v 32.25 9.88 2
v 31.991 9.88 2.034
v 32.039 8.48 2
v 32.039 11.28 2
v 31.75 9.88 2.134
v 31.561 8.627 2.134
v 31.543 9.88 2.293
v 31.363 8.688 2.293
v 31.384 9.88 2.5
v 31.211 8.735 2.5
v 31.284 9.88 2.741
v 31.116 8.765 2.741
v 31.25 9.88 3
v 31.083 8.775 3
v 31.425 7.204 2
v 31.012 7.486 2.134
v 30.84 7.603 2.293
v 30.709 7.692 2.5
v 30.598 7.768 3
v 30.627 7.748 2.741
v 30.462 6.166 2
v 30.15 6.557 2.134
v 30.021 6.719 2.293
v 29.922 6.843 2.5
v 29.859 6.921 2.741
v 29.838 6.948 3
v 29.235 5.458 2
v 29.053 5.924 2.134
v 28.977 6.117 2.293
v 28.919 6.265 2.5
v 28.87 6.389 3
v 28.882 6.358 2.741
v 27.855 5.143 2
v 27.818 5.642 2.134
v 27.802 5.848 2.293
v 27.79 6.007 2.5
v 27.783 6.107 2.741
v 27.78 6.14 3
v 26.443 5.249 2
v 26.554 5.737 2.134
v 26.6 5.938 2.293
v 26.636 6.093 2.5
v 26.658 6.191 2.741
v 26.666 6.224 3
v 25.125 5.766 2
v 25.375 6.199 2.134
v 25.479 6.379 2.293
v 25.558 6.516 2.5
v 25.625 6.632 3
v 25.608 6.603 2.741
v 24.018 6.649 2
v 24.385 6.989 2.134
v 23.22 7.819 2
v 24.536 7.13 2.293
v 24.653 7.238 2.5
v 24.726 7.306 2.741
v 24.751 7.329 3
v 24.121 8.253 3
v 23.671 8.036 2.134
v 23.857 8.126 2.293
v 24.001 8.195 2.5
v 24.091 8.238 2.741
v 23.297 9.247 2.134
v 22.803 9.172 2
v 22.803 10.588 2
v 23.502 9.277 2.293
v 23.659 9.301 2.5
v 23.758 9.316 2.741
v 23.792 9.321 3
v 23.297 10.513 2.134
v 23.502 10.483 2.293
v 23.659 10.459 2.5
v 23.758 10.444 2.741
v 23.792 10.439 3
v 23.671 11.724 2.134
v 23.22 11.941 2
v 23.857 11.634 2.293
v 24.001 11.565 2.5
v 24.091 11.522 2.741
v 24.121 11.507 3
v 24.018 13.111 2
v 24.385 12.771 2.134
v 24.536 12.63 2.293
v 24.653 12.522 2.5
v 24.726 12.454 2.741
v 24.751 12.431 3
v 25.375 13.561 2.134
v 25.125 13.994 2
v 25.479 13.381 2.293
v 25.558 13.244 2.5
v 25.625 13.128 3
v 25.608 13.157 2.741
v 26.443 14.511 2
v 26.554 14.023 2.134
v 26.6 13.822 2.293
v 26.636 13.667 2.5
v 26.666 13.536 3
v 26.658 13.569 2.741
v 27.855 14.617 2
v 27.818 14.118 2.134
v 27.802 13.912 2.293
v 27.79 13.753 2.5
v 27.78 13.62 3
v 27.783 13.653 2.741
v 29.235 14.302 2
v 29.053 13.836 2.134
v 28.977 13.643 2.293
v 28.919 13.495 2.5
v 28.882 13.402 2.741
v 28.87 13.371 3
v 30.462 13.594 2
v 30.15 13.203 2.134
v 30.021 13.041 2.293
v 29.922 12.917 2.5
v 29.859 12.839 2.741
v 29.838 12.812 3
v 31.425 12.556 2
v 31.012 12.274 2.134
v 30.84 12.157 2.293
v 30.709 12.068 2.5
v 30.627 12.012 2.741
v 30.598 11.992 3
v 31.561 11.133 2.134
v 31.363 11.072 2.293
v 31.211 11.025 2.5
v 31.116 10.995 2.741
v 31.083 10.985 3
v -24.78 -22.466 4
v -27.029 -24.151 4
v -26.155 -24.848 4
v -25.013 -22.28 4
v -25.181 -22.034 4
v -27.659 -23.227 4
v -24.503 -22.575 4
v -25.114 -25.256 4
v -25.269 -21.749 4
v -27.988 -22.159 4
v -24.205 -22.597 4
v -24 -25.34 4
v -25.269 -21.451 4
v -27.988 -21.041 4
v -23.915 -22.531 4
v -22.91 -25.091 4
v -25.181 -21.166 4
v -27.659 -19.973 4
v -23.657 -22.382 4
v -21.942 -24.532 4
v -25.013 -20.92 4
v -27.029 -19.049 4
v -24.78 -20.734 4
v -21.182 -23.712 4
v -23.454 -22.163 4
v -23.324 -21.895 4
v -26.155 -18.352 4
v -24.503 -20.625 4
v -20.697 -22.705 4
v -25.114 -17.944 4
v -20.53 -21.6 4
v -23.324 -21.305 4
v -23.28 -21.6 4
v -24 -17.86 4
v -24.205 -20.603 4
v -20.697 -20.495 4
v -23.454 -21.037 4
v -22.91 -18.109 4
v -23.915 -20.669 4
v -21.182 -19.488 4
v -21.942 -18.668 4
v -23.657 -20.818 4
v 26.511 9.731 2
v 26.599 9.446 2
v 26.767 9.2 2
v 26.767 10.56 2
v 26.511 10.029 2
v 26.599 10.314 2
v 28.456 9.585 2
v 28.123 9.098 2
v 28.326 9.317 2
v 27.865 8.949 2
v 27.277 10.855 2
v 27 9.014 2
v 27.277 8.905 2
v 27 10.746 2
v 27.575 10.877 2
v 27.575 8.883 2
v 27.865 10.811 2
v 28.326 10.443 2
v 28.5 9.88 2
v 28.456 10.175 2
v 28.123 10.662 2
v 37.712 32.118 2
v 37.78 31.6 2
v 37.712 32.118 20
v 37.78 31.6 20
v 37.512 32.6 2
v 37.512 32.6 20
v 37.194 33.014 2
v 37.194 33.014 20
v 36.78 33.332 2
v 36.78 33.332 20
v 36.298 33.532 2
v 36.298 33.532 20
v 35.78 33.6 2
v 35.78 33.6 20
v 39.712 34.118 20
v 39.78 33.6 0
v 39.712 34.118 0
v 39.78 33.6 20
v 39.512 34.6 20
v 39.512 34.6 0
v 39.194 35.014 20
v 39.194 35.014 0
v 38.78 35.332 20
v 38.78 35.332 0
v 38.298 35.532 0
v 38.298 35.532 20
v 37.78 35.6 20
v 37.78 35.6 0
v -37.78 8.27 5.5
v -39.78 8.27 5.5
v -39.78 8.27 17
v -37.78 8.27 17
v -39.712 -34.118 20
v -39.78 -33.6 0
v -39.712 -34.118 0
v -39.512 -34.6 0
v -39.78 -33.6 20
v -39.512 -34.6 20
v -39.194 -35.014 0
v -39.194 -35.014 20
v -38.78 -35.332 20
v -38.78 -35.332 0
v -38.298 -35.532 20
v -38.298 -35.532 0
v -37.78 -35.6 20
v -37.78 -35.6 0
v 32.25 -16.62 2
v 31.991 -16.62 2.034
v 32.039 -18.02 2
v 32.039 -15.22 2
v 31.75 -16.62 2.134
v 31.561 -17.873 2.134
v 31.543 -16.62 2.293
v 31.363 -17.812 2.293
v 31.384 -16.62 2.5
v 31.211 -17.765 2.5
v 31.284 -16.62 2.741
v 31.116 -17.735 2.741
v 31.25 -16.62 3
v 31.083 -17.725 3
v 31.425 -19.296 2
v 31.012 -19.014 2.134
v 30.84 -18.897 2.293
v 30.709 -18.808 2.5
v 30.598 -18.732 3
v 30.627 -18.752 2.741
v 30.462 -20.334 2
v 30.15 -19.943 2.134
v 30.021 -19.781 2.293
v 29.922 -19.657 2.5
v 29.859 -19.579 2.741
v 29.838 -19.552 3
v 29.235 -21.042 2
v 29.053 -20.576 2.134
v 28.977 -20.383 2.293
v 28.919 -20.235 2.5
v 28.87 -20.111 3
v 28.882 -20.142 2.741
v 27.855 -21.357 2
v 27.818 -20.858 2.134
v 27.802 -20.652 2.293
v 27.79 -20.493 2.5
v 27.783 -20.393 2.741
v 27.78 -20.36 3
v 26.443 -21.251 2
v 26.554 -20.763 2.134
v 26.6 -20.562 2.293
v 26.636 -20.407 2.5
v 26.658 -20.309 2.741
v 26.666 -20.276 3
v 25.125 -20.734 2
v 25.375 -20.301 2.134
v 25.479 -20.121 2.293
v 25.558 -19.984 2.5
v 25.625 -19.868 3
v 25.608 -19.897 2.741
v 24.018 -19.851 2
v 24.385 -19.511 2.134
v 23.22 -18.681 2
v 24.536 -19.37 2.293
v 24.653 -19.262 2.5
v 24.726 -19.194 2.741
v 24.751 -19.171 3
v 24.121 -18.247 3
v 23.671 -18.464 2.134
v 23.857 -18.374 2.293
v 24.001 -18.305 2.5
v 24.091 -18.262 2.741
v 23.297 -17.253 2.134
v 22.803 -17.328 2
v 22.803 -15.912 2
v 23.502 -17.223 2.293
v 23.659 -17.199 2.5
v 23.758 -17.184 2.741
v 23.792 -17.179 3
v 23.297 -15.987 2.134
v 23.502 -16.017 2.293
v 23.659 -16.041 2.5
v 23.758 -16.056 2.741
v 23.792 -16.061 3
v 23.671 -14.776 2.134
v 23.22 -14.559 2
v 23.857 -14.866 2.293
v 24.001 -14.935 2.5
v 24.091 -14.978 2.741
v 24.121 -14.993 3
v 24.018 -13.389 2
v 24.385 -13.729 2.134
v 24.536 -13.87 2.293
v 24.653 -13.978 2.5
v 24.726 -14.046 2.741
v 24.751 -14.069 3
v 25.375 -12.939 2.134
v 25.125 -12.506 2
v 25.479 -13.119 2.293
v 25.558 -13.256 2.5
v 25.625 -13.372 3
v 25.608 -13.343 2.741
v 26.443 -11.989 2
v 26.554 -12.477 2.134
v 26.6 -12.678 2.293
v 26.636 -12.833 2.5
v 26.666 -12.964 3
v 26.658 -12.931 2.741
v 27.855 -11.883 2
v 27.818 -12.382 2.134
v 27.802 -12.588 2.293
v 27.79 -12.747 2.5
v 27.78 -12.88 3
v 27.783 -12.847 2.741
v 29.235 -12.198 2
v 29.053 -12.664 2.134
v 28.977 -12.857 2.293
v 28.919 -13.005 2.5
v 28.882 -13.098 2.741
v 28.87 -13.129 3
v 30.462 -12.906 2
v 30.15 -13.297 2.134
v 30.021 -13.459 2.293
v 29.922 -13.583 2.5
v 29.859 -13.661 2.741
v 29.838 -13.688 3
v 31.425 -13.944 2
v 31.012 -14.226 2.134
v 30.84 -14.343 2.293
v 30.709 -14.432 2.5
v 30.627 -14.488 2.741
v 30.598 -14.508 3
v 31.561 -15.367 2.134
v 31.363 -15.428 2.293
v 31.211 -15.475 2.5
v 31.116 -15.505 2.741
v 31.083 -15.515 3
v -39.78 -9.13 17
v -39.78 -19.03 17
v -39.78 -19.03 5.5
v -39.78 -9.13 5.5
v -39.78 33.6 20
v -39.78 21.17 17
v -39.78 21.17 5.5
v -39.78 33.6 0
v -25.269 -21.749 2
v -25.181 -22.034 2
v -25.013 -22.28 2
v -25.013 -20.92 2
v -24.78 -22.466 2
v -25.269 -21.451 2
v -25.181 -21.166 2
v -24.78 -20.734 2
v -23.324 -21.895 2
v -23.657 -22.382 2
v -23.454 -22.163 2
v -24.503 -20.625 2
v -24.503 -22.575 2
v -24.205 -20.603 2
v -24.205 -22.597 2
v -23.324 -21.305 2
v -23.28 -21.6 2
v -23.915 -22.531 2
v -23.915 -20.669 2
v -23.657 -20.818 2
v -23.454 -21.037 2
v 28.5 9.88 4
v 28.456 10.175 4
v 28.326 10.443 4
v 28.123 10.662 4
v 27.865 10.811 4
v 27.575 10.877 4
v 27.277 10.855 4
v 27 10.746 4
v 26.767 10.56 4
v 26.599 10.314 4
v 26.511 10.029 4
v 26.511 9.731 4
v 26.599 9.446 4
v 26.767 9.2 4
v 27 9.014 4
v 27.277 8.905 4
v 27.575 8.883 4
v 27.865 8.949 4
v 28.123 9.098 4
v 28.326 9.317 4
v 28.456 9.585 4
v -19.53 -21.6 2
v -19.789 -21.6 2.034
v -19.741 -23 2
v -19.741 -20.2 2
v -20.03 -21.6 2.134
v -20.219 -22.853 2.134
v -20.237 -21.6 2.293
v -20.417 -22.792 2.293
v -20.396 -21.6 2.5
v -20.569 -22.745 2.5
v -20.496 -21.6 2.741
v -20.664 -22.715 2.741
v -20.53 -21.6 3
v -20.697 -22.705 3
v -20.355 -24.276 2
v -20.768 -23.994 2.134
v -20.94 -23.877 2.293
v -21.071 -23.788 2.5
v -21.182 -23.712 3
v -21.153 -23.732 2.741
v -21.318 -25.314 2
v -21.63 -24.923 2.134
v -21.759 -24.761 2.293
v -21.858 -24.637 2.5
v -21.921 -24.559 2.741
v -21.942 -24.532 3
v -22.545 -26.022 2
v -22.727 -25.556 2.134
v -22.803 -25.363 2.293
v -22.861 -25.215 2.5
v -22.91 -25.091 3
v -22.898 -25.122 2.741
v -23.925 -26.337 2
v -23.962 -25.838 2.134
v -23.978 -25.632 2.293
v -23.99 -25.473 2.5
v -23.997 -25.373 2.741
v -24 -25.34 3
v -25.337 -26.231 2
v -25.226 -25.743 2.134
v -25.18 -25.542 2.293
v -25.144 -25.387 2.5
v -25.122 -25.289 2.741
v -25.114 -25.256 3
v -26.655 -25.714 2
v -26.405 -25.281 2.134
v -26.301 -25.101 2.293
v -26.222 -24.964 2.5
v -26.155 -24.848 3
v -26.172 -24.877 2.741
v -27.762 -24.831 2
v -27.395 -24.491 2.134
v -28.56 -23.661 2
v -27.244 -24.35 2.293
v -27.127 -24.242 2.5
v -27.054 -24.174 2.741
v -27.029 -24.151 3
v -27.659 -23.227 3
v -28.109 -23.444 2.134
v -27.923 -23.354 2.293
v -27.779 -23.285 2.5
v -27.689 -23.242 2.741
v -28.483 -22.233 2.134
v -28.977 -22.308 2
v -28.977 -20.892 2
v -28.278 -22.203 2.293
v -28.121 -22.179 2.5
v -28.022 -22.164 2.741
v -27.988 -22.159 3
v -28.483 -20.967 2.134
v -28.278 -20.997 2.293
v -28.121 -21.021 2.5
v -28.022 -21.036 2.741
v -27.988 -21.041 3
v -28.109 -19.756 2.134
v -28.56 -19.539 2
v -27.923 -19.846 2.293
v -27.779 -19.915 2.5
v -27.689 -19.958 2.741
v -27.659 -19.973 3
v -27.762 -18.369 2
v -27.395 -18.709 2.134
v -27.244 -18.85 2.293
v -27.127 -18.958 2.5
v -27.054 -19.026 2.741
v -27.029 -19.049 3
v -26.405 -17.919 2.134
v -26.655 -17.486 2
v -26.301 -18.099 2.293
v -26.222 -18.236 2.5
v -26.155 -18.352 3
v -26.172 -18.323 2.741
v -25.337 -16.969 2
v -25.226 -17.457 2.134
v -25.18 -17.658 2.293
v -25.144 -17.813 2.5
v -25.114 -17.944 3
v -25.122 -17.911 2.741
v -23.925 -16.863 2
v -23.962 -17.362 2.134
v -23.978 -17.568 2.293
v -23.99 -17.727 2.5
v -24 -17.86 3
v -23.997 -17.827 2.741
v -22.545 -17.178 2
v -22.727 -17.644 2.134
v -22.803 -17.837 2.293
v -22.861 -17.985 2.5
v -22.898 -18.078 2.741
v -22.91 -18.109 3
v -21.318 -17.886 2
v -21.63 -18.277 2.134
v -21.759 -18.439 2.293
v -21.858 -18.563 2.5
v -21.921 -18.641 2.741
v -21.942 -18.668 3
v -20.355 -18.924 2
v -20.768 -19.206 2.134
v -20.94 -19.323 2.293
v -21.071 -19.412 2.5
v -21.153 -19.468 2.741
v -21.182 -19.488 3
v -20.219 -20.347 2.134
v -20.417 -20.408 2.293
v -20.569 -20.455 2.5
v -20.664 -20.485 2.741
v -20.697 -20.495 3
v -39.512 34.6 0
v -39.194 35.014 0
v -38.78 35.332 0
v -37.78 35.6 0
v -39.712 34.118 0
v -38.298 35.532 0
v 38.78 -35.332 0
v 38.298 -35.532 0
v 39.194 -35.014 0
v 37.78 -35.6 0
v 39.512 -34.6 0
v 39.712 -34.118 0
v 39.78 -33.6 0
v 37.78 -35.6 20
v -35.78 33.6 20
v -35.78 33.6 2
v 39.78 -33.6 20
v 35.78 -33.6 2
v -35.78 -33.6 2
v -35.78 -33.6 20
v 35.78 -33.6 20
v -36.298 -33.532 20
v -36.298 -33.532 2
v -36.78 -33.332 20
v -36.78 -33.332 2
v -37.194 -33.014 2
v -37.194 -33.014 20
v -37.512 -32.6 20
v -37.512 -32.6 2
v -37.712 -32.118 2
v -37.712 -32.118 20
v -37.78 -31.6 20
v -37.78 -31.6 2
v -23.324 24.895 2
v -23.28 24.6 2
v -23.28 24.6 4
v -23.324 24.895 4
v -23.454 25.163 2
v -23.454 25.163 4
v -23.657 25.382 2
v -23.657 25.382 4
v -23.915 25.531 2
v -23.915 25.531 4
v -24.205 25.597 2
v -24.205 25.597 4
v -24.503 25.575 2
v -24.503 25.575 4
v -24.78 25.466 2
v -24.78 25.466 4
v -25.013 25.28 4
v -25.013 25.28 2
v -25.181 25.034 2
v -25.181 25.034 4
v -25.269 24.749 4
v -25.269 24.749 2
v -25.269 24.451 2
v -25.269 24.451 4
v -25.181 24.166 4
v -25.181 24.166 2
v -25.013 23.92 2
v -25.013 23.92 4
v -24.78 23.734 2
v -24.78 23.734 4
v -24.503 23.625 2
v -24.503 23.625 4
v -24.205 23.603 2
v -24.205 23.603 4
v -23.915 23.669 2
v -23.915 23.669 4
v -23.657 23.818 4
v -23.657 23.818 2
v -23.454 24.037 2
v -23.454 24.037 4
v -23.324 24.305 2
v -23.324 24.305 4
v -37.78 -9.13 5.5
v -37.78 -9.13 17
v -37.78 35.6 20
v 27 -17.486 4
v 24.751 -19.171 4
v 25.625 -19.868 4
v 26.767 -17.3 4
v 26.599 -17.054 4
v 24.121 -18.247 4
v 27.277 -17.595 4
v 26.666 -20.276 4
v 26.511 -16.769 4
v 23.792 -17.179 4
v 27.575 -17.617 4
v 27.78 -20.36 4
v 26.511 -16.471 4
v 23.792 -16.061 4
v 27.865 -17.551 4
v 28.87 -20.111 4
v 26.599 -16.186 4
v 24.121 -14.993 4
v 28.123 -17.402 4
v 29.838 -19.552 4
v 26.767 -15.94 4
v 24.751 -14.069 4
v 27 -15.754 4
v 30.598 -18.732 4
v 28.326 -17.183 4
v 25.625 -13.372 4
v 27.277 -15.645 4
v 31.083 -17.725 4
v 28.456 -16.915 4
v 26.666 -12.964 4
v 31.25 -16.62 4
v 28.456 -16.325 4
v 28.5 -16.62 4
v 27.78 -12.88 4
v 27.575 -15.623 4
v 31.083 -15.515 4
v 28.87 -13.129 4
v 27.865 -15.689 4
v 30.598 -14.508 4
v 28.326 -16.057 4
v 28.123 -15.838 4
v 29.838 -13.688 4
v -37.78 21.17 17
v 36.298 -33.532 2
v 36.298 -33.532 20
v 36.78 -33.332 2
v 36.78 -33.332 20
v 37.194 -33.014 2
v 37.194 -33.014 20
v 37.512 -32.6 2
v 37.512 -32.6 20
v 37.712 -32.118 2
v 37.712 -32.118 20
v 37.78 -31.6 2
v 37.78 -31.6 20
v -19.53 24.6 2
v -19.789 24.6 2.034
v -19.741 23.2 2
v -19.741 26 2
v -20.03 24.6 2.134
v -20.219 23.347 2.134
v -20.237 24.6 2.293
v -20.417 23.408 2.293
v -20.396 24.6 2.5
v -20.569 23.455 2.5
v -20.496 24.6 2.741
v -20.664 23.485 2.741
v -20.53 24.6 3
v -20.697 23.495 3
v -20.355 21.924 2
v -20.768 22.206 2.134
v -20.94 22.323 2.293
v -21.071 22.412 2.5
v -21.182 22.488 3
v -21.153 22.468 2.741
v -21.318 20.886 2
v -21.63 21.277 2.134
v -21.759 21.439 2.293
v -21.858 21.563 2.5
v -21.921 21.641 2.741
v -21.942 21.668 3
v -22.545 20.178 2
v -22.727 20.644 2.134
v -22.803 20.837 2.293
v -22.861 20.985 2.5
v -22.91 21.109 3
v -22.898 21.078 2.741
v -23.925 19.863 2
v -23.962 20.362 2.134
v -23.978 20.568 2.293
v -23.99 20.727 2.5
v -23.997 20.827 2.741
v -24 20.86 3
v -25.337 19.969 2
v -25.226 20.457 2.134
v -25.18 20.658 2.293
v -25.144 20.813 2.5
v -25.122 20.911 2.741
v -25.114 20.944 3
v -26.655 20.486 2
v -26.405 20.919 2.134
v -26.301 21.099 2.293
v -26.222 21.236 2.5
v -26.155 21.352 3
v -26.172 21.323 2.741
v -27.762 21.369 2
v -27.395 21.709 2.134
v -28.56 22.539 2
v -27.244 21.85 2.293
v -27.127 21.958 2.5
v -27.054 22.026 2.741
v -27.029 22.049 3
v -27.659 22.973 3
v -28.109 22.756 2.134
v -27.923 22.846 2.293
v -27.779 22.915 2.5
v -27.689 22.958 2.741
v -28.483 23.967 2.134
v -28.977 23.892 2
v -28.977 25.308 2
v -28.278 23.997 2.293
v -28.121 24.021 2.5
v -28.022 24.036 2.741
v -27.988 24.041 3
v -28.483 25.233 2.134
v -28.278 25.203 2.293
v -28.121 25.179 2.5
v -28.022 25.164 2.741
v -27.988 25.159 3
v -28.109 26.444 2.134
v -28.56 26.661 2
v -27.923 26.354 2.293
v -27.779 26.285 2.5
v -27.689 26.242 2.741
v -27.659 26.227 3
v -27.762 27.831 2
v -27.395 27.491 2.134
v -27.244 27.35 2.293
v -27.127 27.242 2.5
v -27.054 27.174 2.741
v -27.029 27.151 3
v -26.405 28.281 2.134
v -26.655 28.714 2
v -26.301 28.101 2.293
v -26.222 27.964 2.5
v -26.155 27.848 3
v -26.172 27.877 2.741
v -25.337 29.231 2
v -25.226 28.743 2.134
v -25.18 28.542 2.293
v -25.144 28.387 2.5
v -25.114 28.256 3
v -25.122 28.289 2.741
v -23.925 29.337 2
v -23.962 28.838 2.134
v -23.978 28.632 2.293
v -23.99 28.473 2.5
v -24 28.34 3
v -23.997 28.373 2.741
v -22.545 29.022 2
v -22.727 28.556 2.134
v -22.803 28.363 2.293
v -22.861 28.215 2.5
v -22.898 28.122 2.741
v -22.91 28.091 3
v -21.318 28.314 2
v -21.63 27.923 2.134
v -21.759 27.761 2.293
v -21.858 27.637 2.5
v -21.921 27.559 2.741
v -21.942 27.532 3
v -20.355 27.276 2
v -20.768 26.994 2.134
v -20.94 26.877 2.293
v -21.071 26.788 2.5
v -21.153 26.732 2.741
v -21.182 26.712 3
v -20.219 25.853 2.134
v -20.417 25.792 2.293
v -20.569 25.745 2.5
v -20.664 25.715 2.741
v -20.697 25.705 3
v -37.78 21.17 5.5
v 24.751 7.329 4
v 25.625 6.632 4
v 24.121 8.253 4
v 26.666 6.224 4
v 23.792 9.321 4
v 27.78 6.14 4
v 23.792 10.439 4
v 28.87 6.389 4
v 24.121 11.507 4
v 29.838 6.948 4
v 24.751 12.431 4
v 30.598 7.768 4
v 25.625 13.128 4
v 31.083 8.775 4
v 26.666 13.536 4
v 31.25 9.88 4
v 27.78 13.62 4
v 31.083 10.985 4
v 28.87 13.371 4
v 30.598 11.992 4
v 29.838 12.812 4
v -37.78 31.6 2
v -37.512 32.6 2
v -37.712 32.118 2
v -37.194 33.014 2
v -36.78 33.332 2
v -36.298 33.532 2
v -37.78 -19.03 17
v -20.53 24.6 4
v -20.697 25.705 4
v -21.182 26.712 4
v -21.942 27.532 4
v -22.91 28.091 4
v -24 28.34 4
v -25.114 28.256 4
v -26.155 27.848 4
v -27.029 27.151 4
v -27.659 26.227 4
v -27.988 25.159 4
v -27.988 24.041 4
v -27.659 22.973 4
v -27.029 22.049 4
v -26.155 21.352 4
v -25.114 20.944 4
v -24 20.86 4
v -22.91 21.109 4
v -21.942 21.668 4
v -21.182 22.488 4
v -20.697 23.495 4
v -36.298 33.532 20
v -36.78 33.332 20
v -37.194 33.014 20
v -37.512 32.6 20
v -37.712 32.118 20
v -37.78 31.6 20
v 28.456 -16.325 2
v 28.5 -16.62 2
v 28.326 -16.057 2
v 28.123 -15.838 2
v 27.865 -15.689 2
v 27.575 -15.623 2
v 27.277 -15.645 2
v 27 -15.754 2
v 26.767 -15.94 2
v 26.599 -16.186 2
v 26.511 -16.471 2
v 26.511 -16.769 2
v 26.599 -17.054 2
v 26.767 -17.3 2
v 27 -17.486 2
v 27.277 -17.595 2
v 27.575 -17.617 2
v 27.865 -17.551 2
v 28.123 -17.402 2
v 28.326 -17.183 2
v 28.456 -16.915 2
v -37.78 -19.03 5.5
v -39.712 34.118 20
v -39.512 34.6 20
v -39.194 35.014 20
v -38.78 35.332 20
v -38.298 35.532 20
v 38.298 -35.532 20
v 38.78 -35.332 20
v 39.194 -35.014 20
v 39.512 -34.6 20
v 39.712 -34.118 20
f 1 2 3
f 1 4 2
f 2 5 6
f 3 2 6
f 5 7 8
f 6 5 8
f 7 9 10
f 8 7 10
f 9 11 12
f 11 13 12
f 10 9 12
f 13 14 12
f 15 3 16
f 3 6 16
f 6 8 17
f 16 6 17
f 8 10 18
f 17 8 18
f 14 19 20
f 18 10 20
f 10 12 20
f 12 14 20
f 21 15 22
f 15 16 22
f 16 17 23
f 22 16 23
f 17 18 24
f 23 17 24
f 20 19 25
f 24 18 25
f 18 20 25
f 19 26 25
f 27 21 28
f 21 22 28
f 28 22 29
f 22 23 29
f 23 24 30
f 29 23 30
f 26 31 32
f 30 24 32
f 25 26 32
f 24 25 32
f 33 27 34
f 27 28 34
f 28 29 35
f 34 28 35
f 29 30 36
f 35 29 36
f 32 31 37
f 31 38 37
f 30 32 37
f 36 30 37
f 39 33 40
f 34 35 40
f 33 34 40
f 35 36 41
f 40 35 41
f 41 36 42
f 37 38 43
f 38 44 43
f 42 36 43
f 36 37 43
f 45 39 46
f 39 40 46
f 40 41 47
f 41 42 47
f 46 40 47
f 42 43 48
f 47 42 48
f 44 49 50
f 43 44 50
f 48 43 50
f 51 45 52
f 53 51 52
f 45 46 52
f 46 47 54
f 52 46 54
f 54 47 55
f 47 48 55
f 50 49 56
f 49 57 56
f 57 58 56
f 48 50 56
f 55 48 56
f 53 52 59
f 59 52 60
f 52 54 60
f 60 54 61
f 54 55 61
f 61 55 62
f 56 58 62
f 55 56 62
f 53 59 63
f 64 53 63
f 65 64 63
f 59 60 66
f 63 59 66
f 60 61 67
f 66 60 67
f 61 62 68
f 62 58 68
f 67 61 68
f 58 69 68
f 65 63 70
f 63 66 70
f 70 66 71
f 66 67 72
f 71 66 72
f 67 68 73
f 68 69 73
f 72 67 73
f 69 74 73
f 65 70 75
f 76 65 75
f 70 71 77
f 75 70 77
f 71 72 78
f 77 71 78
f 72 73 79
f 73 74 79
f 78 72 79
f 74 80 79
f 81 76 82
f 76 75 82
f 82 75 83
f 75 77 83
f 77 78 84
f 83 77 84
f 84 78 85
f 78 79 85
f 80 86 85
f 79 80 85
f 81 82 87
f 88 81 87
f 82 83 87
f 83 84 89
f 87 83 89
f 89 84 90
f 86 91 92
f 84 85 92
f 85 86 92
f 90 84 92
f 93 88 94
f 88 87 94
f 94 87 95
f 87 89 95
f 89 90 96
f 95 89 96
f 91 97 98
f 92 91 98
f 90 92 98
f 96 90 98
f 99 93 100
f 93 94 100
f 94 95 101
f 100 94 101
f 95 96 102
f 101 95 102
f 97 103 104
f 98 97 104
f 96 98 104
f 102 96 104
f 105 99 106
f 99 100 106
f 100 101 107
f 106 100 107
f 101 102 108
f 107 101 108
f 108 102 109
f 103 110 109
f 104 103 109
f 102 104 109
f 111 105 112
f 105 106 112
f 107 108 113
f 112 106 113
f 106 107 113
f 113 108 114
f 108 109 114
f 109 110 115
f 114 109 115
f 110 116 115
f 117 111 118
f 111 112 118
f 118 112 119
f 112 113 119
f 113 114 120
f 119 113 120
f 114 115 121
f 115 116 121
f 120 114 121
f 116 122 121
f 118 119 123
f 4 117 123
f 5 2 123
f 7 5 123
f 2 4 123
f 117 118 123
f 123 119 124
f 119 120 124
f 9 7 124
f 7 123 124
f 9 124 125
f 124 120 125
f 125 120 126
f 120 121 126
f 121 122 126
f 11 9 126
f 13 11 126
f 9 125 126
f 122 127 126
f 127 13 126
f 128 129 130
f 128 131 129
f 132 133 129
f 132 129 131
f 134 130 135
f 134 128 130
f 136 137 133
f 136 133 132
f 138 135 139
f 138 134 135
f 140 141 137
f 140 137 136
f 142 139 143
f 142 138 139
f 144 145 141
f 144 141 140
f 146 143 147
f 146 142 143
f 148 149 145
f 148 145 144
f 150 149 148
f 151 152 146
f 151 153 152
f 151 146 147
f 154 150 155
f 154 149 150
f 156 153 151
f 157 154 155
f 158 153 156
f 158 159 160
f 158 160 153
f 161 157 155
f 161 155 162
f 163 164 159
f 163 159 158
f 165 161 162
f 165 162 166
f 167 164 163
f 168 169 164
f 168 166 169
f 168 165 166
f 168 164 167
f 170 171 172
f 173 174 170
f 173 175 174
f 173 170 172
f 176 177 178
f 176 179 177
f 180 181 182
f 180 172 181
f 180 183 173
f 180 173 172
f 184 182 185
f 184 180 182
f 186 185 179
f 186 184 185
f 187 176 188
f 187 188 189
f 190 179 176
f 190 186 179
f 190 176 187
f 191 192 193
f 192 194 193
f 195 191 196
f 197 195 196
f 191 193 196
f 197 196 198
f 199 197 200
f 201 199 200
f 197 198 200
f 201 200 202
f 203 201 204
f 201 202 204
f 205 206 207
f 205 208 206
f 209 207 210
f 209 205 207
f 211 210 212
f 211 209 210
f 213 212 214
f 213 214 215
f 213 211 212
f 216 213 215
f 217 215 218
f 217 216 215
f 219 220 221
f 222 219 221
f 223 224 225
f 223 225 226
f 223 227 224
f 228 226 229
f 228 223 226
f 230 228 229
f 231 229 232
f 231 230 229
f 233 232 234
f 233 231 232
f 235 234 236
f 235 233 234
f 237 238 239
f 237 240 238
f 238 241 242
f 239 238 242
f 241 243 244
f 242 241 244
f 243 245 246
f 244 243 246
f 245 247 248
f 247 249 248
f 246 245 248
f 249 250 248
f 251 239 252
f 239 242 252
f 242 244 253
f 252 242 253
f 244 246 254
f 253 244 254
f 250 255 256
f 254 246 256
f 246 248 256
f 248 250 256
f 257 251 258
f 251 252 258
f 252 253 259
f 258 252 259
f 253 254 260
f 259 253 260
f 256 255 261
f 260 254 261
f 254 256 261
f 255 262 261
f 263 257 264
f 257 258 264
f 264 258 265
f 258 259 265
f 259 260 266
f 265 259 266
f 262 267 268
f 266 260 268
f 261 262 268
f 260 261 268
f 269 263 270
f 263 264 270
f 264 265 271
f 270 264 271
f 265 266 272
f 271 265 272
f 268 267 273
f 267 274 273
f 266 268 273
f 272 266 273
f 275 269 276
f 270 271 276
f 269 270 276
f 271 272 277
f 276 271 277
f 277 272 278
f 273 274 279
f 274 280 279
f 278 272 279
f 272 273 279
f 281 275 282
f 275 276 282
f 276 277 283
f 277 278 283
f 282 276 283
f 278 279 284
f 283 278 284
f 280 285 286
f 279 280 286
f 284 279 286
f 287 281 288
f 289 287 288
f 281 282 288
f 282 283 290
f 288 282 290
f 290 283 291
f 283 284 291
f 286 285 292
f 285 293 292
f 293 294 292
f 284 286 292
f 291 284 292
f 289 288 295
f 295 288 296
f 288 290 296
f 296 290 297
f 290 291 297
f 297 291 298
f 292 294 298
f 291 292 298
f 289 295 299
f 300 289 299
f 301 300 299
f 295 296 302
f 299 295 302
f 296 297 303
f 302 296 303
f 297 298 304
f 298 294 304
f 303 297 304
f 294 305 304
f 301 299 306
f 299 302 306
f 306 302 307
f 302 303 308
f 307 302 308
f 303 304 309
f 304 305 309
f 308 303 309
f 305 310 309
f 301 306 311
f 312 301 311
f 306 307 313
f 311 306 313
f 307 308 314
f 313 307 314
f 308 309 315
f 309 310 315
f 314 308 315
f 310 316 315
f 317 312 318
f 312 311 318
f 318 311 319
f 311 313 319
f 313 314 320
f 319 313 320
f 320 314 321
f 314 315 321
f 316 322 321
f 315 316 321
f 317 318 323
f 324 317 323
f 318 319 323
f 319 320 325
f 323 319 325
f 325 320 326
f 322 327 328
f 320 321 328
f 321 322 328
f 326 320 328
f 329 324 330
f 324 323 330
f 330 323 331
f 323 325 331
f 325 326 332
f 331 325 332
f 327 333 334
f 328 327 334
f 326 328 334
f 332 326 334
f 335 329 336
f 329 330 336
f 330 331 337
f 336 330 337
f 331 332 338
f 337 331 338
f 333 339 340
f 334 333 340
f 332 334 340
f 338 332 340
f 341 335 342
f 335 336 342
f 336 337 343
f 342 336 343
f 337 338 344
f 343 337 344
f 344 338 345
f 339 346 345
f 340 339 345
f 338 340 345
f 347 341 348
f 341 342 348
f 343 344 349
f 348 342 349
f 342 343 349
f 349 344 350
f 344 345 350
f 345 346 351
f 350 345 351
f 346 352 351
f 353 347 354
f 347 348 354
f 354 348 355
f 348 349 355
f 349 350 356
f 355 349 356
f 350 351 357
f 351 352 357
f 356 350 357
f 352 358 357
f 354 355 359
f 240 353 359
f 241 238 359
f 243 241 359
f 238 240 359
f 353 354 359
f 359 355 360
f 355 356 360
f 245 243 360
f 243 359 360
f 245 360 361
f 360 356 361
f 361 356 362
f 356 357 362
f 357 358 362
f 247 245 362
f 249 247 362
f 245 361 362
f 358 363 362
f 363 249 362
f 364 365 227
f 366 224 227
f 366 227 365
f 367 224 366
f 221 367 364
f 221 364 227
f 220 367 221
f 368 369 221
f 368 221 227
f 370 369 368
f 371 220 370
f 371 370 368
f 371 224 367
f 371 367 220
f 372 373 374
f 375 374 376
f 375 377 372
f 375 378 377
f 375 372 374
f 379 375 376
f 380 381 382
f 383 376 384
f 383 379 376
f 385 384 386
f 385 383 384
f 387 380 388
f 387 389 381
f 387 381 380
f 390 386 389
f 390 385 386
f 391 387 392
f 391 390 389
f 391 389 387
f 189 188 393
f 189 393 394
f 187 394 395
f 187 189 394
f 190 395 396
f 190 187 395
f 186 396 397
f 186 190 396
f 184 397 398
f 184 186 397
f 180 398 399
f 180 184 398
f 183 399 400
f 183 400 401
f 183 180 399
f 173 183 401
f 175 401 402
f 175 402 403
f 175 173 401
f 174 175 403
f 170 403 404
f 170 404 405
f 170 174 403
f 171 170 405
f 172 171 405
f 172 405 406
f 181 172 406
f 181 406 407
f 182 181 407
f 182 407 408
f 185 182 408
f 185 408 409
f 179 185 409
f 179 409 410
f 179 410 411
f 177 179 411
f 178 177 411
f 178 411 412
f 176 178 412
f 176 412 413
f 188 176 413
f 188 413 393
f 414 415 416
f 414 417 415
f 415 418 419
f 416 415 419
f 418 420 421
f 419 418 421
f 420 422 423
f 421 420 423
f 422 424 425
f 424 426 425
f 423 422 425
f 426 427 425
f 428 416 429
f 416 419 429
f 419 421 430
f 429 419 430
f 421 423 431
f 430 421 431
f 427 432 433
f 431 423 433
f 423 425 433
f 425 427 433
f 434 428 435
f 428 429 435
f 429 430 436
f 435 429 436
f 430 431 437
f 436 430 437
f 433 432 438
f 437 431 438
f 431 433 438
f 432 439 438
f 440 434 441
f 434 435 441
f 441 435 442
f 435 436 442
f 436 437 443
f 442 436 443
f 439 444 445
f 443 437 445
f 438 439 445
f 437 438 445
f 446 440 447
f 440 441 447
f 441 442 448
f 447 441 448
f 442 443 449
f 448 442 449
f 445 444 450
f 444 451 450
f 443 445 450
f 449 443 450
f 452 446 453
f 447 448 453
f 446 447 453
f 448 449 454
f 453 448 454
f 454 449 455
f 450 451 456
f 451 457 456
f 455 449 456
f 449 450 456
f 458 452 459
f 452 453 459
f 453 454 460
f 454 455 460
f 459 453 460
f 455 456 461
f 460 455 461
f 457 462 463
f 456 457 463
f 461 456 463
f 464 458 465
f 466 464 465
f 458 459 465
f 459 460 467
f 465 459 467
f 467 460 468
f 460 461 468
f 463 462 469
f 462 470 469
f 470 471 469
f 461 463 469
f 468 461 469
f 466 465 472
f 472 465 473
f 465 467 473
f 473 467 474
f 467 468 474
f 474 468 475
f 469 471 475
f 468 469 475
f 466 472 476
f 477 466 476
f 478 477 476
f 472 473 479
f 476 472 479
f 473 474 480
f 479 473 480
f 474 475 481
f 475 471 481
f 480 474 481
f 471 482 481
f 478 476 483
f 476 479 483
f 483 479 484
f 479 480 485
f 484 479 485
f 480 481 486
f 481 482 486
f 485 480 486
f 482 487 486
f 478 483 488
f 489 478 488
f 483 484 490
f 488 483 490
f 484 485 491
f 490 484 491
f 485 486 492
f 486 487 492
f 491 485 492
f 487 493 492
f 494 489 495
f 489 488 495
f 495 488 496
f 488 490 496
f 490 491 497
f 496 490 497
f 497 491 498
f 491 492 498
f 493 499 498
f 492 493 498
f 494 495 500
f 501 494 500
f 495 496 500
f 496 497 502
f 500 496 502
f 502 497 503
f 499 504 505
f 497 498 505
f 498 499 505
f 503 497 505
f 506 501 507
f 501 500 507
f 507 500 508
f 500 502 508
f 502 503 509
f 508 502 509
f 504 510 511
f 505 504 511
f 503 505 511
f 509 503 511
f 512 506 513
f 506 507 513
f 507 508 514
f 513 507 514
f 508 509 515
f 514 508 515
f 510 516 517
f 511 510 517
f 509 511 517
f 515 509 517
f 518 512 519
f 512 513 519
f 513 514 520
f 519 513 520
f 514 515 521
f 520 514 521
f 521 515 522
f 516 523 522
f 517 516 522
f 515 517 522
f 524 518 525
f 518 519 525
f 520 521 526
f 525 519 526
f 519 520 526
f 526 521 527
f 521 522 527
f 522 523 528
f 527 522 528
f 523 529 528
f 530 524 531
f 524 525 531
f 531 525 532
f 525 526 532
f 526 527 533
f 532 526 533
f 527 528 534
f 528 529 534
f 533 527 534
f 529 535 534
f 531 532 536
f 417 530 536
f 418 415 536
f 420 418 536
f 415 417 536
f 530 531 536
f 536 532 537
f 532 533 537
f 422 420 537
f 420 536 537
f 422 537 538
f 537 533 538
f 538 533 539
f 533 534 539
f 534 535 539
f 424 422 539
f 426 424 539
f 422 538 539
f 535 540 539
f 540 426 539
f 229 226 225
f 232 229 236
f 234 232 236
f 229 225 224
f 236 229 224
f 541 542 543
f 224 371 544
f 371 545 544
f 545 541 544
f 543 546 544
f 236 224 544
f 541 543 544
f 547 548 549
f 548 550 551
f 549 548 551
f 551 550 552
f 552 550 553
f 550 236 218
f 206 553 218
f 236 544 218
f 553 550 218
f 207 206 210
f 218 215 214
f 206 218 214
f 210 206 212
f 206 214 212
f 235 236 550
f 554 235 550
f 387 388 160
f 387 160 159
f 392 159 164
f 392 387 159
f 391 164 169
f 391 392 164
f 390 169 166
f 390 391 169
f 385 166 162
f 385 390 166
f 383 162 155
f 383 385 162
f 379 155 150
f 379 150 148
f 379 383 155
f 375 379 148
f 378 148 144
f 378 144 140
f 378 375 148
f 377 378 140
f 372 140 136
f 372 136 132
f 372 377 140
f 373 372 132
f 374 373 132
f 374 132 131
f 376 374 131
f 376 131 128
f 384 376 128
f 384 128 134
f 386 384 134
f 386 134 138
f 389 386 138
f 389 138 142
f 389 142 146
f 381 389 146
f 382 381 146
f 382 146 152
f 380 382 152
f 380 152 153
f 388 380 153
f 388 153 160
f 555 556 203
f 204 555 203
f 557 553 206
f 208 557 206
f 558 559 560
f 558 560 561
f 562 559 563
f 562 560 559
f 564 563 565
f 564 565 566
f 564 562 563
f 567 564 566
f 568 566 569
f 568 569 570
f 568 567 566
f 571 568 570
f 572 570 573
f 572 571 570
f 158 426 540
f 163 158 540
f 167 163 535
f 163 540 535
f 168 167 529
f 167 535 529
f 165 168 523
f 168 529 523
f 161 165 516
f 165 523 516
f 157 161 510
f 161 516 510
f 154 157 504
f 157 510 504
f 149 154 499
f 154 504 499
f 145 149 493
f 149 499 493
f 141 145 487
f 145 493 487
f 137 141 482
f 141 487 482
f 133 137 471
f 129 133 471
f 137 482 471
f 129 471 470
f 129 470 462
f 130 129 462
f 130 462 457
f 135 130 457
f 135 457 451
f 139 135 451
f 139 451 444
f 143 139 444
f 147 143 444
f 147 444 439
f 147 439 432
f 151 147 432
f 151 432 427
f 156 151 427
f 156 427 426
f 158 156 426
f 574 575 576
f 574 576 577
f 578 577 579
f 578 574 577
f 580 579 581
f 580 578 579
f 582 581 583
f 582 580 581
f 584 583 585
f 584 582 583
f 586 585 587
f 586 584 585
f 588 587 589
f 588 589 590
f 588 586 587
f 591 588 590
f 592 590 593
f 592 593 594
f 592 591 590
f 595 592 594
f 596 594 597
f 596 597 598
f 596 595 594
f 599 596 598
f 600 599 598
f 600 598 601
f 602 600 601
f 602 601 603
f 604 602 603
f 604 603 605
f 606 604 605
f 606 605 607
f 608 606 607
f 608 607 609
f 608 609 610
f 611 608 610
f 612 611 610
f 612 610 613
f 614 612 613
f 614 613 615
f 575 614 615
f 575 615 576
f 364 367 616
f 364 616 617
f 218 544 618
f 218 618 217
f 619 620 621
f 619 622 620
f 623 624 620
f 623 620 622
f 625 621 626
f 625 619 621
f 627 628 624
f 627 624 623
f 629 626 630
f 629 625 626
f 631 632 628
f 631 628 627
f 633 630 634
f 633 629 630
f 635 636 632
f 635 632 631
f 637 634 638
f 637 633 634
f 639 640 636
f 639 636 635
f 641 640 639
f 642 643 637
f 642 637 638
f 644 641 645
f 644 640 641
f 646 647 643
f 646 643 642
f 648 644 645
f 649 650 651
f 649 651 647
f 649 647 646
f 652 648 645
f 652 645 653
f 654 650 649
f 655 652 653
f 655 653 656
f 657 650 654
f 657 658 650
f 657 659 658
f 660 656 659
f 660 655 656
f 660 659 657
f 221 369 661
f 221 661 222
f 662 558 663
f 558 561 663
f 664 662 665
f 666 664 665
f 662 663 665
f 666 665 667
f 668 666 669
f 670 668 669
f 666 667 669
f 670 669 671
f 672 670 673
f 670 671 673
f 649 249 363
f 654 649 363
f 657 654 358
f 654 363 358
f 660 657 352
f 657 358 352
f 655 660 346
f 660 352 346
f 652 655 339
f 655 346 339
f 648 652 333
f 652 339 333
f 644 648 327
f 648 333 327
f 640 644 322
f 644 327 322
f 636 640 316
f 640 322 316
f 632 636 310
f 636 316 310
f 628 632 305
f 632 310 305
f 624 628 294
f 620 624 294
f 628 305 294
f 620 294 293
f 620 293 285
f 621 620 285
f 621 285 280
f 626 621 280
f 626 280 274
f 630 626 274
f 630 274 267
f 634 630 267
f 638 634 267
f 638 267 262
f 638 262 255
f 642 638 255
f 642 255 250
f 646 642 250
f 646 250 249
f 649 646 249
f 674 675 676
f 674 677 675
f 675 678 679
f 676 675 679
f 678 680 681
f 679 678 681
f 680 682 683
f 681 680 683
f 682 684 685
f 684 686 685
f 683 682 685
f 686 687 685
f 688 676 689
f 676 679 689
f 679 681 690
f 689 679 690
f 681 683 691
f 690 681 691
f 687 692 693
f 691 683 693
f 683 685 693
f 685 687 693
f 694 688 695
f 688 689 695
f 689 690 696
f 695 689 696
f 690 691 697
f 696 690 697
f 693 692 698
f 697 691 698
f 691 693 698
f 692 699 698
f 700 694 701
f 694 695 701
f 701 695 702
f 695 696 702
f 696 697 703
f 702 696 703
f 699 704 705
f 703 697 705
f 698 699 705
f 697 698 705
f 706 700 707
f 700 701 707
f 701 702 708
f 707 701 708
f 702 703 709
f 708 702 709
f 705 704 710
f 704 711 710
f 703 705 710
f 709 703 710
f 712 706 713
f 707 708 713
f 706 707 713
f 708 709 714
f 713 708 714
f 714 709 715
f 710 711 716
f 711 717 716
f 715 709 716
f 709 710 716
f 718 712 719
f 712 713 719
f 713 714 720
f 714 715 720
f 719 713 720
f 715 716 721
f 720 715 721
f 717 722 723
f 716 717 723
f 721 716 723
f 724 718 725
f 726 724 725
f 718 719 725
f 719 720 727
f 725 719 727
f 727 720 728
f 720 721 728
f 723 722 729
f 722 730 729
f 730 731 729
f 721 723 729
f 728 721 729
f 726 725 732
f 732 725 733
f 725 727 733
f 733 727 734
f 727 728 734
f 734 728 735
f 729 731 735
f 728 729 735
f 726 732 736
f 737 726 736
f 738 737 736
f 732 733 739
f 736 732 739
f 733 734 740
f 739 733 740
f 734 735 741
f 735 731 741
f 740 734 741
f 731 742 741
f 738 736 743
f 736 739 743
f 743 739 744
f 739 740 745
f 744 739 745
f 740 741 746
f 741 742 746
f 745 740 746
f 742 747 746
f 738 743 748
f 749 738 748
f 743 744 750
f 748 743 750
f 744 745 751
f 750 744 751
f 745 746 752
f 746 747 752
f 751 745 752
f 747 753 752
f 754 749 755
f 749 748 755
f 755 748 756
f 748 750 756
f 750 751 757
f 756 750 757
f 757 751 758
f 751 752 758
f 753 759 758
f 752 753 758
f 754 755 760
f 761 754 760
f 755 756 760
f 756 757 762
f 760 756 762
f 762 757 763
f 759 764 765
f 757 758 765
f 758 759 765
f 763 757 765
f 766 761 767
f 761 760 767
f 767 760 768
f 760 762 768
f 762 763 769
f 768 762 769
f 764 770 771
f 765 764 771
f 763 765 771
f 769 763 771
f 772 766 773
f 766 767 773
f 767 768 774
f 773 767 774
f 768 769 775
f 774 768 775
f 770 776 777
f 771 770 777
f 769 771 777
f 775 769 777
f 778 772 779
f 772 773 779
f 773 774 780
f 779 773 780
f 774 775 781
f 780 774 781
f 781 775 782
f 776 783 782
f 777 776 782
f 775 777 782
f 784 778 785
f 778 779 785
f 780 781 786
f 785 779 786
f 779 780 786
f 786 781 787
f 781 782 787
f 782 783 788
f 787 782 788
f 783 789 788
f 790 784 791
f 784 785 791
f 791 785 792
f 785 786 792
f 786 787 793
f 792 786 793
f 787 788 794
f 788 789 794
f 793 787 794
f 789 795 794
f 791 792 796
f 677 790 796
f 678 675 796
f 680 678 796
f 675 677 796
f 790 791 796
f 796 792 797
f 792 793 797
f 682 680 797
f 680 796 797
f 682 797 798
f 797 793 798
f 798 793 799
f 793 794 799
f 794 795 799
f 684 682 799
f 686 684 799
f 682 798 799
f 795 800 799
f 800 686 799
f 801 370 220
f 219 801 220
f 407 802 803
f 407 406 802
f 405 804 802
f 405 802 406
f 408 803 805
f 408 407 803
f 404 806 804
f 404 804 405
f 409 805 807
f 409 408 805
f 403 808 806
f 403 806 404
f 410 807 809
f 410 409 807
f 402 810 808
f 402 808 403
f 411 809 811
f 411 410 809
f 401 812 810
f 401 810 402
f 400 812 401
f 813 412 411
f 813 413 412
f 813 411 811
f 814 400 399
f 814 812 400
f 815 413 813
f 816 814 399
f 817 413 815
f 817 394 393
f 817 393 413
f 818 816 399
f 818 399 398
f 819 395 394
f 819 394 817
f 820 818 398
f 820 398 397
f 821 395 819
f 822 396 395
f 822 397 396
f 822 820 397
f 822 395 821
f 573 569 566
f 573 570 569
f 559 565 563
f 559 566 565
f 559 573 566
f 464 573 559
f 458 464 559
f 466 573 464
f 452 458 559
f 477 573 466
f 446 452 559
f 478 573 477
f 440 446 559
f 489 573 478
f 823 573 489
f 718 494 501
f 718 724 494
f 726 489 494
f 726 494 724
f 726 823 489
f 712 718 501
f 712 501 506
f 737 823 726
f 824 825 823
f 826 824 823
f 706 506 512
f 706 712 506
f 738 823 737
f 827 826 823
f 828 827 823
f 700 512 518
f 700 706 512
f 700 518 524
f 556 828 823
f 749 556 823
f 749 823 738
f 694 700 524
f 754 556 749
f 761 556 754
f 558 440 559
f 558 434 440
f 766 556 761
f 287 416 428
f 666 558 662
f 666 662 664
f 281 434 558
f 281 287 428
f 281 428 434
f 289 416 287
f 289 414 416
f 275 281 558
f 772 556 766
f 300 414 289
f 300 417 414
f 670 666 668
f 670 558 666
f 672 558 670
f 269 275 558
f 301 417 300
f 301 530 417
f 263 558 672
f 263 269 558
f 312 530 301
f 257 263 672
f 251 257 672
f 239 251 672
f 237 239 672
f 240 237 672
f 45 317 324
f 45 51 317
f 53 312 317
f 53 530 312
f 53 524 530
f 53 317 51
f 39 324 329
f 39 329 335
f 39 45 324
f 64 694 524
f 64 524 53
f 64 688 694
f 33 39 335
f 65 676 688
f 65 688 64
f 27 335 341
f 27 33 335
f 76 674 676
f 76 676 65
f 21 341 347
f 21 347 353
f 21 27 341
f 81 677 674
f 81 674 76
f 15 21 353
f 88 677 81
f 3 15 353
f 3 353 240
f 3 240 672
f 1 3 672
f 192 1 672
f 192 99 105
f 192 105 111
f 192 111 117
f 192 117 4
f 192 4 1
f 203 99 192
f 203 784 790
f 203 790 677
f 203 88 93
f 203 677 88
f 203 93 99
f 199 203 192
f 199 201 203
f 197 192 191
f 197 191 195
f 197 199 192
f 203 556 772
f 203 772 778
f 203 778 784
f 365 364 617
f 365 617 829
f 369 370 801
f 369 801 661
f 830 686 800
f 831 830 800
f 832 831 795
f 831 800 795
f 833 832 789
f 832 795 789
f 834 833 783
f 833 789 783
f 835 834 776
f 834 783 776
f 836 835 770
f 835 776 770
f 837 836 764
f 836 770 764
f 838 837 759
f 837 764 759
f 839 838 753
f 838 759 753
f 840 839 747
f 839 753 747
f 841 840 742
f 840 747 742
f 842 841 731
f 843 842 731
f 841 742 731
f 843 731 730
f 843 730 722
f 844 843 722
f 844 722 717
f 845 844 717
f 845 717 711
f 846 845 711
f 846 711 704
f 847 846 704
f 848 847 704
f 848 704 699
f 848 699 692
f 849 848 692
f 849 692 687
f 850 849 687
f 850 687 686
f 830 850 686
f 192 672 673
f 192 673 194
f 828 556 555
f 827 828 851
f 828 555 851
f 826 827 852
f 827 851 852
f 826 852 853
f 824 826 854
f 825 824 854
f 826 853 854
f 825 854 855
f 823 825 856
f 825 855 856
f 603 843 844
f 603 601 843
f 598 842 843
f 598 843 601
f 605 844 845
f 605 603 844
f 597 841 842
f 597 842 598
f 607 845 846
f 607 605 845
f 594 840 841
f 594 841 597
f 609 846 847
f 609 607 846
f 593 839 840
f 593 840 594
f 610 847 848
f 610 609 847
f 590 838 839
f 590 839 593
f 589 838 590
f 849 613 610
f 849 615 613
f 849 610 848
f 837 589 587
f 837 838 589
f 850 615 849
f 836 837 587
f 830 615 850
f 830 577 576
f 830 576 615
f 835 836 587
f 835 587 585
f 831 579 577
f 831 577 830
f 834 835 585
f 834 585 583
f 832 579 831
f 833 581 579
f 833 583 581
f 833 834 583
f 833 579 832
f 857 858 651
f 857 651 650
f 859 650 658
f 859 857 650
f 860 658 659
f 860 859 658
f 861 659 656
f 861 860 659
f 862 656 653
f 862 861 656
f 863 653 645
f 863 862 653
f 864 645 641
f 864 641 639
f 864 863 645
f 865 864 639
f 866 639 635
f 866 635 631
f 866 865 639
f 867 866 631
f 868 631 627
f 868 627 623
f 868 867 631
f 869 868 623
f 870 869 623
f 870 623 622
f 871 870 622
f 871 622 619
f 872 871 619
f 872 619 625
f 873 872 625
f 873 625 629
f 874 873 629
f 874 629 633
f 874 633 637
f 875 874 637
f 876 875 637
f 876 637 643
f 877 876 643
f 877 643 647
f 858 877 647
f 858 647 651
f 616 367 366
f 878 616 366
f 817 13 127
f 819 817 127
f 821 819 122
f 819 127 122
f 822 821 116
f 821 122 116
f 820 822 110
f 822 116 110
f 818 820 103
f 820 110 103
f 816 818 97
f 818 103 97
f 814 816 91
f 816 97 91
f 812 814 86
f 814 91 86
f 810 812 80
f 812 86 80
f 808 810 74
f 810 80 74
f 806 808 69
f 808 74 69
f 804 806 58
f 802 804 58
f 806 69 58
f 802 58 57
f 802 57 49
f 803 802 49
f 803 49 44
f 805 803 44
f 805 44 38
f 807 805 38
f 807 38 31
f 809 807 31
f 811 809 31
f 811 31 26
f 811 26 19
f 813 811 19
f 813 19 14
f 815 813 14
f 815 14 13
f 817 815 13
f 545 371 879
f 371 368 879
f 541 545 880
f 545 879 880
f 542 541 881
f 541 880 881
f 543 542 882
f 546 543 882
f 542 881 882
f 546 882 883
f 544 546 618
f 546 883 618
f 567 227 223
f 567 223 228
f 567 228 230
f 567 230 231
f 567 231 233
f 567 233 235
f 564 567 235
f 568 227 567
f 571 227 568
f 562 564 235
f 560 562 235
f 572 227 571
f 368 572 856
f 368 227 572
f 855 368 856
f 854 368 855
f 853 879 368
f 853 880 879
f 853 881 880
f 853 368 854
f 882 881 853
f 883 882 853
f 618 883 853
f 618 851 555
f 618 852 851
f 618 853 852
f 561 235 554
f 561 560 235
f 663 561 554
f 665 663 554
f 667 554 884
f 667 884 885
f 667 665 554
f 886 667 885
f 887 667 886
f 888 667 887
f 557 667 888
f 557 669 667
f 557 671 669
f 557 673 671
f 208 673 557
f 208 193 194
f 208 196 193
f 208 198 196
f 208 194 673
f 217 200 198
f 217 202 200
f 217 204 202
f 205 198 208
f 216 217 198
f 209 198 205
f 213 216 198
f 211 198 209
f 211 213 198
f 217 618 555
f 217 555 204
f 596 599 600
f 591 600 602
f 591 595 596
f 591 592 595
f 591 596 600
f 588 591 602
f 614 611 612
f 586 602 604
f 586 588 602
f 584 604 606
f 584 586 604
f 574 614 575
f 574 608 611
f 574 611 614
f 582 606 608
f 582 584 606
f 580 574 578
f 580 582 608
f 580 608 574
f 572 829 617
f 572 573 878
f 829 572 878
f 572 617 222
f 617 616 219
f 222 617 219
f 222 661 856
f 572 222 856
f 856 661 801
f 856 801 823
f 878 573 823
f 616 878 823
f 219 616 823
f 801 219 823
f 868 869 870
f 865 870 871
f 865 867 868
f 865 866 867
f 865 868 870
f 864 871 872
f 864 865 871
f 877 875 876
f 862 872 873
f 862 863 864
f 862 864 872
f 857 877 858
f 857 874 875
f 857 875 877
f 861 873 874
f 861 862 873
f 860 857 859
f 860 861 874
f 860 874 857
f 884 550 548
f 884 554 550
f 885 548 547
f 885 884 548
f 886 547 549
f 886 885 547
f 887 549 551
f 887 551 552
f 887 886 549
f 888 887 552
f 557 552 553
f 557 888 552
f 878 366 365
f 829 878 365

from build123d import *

# Parameters (mm, degrees)
F0_W      = 79.56
F0_H      = 71.2
F1_DEPTH  = 20
F3_R      = 2
F5_T      = 2
F6_R      = 2
F7_W      = 12.9
F7_H      = 11.5
F8_DEPTH  = 2
F9_W      = 9.9
F9_H      = 11.5
F10_DEPTH = 2
F11_R     = 3.75
F11_R_2   = 1
F12_DEPTH = 4
F13_R     = 1


# Not quite as in the source:
# - a shell that OpenCascade refuses in one call is made with other operations: the cavity is built on its own and cut out


with BuildPart() as f1:
    # F0 (on Top) → F1 (new body)
    with BuildSketch(Plane.XY):
        Rectangle(F0_W, F0_H)
    extrude(amount=F1_DEPTH)

    # F3
    f3_edges = [f1.edges().sort_by_distance(p)[0] for p in [
        (39.78, -35.6, 10),
        (39.78, 35.6, 10),
        (-39.78, 35.6, 10),
        (-39.78, -35.6, 10),
    ]]
    fillet(f3_edges, radius=F3_R)

    # F5: shell of thickness 2, made by hand


with BuildPart() as f5_core1:
    # F5_t2: copy of F1
    add(f1.part)

    # the walls: a layer under each face that stays
    f5_faces = [f5_core1.faces().sort_by_distance(p)[0] for p in [
        (0, 35.6, 10),
        (0, 0, 0),
        (39.78, 0, 10),
        (-39.78, 0, 10),
        (0, -35.6, 10),
    ]]
    thicken(f5_faces, amount=-F5_T, mode=Mode.SUBTRACT)


with BuildPart() as f1_1:
    add(f1.part)

    # what is left inside the walls is the cavity
    f5_cavity = [f5_core1.part.solids().sort_by_distance(p)[0] for p in [
        (0, -11.2, 2.02),
    ]]
    add(f5_cavity, mode=Mode.SUBTRACT)

    # F6
    f6_edges = [f1_1.edges().sort_by_distance(p)[0] for p in [
        (-37.78, 33.6, 11),
        (37.78, 33.6, 11),
        (-37.78, -33.6, 11),
        (37.78, -33.6, 11),
    ]]
    fillet(f6_edges, radius=F6_R)

    # F7 (on face) → F8 (cut)
    with BuildSketch(Plane(origin=(-39.78, 0, 0), x_dir=(0, -1, 0), z_dir=(-1, 0, 0))):
        with Locations((-14.72, 11.25)):
            Rectangle(F7_W, F7_H)
    extrude(amount=-F8_DEPTH, mode=Mode.SUBTRACT)

    # F9 (on face) → F10 (cut)
    with BuildSketch(Plane(origin=(-39.78, 0, 0), x_dir=(0, -1, 0), z_dir=(-1, 0, 0))):
        with Locations((14.08, 11.25)):
            Rectangle(F9_W, F9_H)
    extrude(amount=-F10_DEPTH, mode=Mode.SUBTRACT)

    # F11 (on Top) → F12 (join)
    with BuildSketch(Plane.XY):
        with Locations((-24.28, 24.6)):
            Circle(F11_R)
        with Locations((-24.28, 24.6)):
            Circle(F11_R_2, mode=Mode.SUBTRACT)
        with Locations((27.5, 9.88)):
            Circle(F11_R)
        with Locations((27.5, 9.88)):
            Circle(F11_R_2, mode=Mode.SUBTRACT)
        with Locations((-24.28, -21.6)):
            Circle(F11_R)
        with Locations((-24.28, -21.6)):
            Circle(F11_R_2, mode=Mode.SUBTRACT)
        with Locations((27.5, -16.62)):
            Circle(F11_R)
        with Locations((27.5, -16.62)):
            Circle(F11_R_2, mode=Mode.SUBTRACT)
    extrude(amount=F12_DEPTH)

    # F13
    f13_edges = [f1_1.edges().sort_by_distance(p)[0] for p in [
        (-28.03, 24.6, 2),
        (-28.03, -21.6, 2),
        (23.75, 9.88, 2),
        (23.75, -16.62, 2),
    ]]
    fillet(f13_edges, radius=F13_R)


solid = f1_1.part
